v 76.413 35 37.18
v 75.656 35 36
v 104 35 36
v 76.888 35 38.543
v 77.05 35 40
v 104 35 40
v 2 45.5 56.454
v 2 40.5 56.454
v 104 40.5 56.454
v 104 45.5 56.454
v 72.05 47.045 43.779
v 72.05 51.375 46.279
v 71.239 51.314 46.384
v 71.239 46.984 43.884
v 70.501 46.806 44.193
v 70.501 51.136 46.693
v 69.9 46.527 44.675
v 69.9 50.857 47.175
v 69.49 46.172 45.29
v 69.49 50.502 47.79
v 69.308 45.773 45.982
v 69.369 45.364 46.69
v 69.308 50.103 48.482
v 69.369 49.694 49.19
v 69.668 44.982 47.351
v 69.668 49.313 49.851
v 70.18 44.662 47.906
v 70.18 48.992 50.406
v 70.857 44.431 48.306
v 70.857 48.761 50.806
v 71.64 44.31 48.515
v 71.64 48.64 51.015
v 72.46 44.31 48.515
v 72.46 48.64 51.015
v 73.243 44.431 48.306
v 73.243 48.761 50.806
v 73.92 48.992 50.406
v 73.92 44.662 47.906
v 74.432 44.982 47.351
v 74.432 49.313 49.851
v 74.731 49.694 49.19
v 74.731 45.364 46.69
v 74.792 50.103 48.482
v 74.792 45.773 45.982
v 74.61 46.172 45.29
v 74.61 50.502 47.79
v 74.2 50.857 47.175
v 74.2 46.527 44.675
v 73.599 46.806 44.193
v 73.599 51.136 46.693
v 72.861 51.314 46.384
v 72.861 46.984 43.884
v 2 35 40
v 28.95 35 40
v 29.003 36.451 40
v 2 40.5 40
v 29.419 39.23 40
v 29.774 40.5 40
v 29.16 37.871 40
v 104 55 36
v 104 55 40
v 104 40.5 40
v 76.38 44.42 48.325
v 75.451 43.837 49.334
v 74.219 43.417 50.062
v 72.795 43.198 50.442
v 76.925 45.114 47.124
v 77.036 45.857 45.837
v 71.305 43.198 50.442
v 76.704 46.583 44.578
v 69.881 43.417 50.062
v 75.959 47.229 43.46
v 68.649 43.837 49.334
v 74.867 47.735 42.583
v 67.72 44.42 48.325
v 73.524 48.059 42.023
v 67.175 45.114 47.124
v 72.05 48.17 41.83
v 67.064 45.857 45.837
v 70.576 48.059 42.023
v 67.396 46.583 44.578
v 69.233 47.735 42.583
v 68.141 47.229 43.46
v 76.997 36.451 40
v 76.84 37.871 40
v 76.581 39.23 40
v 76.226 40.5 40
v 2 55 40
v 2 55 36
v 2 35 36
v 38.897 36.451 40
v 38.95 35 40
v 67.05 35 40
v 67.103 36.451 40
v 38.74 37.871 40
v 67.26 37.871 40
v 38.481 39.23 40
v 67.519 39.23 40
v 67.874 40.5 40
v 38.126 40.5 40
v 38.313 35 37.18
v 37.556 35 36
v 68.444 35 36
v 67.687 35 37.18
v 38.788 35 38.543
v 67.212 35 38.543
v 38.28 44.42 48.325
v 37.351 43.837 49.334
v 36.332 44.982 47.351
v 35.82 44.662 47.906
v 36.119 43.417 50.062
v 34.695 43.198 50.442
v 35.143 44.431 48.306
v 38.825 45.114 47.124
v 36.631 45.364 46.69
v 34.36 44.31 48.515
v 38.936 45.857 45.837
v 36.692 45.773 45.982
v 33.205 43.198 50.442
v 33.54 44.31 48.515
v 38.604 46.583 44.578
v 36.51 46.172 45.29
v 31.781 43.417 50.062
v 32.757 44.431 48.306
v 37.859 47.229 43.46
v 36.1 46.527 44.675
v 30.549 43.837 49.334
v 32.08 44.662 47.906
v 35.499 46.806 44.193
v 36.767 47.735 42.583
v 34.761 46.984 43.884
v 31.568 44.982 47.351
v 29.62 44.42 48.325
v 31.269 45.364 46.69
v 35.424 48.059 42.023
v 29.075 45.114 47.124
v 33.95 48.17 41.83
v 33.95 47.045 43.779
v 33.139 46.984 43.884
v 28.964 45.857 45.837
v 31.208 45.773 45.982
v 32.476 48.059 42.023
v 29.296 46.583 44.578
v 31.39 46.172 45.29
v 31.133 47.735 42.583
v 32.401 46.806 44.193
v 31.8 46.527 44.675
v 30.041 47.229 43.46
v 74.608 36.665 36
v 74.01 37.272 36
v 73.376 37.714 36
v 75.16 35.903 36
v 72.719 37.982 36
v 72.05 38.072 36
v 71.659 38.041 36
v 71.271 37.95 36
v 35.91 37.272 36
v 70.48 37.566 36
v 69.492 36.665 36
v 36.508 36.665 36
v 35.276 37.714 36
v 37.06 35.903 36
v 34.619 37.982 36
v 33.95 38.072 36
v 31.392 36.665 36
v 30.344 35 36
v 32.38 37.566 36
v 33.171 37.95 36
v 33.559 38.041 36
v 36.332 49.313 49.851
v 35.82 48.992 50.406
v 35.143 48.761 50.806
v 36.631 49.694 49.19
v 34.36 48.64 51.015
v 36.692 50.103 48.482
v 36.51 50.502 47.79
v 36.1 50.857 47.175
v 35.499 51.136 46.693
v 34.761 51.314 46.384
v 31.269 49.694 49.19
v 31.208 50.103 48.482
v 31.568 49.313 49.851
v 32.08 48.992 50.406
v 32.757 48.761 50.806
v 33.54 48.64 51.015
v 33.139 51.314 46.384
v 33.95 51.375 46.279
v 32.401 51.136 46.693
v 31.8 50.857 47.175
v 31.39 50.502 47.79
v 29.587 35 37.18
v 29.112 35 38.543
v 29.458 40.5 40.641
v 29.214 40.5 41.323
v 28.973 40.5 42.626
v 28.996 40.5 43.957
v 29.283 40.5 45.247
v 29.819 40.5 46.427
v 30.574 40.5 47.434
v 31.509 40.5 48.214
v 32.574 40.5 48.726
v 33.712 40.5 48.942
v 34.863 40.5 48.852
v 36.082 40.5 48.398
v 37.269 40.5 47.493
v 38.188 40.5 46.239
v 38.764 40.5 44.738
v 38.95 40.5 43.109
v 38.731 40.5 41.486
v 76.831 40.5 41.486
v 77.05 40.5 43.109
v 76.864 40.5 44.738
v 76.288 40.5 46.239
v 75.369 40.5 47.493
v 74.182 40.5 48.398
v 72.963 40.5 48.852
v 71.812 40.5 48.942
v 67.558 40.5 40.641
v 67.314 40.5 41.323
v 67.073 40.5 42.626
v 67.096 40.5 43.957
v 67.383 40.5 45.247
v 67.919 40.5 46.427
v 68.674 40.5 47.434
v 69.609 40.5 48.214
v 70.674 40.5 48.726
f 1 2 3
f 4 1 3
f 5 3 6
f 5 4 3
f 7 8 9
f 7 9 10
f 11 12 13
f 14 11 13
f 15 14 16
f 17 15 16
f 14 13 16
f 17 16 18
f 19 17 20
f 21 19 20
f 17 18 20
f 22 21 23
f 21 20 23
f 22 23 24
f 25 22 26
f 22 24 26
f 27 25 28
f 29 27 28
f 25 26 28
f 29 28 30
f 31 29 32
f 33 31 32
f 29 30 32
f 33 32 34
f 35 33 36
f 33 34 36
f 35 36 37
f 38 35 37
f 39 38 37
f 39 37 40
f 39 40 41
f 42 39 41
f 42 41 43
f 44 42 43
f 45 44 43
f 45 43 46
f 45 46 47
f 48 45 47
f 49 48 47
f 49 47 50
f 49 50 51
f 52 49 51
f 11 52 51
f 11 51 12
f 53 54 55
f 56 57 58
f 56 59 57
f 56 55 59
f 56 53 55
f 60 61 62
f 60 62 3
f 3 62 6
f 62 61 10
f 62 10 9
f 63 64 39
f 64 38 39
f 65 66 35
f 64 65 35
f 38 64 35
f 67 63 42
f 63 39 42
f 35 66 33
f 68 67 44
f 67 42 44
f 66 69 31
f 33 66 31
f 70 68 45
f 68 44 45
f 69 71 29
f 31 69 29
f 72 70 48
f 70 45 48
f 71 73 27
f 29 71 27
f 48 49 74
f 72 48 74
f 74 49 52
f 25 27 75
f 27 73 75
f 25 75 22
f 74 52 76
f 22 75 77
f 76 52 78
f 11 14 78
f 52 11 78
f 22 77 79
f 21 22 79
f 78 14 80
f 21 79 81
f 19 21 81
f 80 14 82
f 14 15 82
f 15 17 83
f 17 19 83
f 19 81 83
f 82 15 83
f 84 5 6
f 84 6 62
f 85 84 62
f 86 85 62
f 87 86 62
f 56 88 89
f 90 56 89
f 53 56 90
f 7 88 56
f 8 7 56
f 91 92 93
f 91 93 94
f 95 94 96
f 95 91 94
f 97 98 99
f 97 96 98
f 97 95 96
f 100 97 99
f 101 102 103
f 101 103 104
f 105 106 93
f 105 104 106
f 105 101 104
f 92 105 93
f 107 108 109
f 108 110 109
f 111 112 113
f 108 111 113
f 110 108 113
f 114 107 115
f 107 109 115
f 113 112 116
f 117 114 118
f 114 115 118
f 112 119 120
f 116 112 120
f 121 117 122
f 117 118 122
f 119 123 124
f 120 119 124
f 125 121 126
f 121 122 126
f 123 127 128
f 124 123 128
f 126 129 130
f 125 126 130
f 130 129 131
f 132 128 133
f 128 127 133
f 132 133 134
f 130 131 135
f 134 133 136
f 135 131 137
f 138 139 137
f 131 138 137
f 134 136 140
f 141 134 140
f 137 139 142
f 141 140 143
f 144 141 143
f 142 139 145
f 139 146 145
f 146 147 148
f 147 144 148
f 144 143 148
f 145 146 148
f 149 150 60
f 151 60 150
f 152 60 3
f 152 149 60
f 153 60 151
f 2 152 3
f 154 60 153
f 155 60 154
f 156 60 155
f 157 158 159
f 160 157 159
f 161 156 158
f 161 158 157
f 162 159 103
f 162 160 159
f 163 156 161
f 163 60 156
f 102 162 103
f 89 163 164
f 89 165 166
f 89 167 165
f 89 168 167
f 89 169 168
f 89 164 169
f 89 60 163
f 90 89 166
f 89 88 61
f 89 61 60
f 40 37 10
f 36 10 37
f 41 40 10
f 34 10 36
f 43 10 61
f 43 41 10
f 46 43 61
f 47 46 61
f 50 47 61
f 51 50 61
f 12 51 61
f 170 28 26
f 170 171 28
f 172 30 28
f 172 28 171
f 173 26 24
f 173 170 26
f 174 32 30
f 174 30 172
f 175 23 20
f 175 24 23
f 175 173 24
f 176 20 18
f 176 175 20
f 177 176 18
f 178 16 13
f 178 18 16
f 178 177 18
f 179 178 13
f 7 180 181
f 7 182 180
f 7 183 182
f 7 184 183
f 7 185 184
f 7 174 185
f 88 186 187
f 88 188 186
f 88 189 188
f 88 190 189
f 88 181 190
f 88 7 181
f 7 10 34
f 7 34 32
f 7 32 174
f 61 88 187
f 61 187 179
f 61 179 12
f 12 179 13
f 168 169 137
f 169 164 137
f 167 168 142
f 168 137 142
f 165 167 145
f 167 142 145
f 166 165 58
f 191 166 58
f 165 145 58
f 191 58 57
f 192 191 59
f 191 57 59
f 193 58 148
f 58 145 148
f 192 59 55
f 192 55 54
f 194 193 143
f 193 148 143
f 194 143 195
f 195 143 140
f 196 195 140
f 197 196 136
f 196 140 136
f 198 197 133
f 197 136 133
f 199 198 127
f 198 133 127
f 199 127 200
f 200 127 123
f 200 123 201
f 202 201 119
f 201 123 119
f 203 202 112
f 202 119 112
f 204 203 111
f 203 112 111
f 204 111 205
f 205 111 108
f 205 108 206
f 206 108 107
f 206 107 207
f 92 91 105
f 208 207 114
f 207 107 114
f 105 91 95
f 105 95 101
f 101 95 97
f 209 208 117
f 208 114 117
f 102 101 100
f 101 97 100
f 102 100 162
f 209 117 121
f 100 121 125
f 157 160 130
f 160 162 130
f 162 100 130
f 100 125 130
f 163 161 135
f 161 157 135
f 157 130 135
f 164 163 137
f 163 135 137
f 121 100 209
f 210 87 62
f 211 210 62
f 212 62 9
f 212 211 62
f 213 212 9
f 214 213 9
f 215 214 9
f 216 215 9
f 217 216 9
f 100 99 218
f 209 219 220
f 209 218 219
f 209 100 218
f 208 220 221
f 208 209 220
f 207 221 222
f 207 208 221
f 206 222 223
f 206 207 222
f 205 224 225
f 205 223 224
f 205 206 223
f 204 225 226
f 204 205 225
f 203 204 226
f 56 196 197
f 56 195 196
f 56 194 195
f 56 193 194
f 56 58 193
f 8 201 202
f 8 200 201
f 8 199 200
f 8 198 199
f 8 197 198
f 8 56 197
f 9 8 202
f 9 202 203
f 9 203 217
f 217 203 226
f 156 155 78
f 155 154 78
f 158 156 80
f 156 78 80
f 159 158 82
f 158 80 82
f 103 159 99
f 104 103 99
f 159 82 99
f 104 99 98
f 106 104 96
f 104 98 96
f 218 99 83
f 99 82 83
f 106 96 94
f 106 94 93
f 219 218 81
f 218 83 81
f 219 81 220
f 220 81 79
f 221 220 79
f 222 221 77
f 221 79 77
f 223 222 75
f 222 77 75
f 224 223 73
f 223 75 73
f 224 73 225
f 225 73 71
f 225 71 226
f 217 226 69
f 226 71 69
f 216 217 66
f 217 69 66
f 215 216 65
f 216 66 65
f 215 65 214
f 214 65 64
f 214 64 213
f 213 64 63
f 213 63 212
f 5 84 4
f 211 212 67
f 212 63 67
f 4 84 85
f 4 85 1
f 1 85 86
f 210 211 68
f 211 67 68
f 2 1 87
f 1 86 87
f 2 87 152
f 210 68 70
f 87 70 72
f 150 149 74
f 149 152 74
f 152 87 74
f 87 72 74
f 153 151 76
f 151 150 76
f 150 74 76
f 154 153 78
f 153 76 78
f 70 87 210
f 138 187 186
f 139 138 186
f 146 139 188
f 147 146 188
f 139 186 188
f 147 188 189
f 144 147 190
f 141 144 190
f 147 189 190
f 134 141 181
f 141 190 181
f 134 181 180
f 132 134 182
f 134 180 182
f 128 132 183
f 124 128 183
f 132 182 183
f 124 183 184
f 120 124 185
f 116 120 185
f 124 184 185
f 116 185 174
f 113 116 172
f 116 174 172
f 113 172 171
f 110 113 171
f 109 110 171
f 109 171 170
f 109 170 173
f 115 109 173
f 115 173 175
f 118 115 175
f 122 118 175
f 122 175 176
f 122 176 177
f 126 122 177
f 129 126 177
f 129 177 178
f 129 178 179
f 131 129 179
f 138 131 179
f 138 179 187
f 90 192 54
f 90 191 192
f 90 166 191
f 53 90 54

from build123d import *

# Parameters (mm, degrees)
PAD004_DEPTH            = 102
SKETCH006_R             = 2.75
POCKET001_DEPTH         = 19.3215080757
SKETCH007_R             = 5
POCKET002_DEPTH         = 14.3215080757
BODY002_PLACEMENT_ANGLE = 180


with BuildPart() as part:
    # Sketch004 → Pad004 (new body)
    with BuildSketch(Plane.YZ):
        Polygon((-5.5, 4), (-5.5, 20.4544826719), (-10.5, 20.4544826719), (-20, 4), (-20, 0), (0, 0), (0, 4), align=None)
    extrude(amount=-PAD004_DEPTH)

    # Sketch006 (on Face3 of Pad004) → Pocket001 (cut, through all)
    with BuildSketch(Plane(origin=(0, -16.7320508076, 9.6602540378), x_dir=(0, -0.5, -0.8660254038), z_dir=(0, -0.8660254038, 0.5))):
        with Locations((-3.4641016151, -31.95)):
            Circle(SKETCH006_R)
        with Locations((-3.4641016151, -70.05)):
            Circle(SKETCH006_R)
    extrude(amount=-POCKET001_DEPTH, mode=Mode.SUBTRACT)

    # Sketch007 (on Face10 of Pocket001) → Pocket002 (cut, through all)
    with BuildSketch(Plane(origin=(0, -12.4019237886, 7.1602540378), x_dir=(0, -0.5, -0.8660254038), z_dir=(0, -0.8660254038, 0.5))):
        with Locations((-3.4641016151, -31.95)):
            Circle(SKETCH007_R)
        with Locations((-3.4641016151, -70.05)):
            Circle(SKETCH007_R)
    extrude(amount=-POCKET002_DEPTH, mode=Mode.SUBTRACT)


with BuildPart() as part_1:
    # Body002 placement: moved
    add(part.part.moved(Location((2, 35, 36))).rotate(Axis((2, 35, 36), (0, 0, 1)), BODY002_PLACEMENT_ANGLE))


solid = part_1.part
